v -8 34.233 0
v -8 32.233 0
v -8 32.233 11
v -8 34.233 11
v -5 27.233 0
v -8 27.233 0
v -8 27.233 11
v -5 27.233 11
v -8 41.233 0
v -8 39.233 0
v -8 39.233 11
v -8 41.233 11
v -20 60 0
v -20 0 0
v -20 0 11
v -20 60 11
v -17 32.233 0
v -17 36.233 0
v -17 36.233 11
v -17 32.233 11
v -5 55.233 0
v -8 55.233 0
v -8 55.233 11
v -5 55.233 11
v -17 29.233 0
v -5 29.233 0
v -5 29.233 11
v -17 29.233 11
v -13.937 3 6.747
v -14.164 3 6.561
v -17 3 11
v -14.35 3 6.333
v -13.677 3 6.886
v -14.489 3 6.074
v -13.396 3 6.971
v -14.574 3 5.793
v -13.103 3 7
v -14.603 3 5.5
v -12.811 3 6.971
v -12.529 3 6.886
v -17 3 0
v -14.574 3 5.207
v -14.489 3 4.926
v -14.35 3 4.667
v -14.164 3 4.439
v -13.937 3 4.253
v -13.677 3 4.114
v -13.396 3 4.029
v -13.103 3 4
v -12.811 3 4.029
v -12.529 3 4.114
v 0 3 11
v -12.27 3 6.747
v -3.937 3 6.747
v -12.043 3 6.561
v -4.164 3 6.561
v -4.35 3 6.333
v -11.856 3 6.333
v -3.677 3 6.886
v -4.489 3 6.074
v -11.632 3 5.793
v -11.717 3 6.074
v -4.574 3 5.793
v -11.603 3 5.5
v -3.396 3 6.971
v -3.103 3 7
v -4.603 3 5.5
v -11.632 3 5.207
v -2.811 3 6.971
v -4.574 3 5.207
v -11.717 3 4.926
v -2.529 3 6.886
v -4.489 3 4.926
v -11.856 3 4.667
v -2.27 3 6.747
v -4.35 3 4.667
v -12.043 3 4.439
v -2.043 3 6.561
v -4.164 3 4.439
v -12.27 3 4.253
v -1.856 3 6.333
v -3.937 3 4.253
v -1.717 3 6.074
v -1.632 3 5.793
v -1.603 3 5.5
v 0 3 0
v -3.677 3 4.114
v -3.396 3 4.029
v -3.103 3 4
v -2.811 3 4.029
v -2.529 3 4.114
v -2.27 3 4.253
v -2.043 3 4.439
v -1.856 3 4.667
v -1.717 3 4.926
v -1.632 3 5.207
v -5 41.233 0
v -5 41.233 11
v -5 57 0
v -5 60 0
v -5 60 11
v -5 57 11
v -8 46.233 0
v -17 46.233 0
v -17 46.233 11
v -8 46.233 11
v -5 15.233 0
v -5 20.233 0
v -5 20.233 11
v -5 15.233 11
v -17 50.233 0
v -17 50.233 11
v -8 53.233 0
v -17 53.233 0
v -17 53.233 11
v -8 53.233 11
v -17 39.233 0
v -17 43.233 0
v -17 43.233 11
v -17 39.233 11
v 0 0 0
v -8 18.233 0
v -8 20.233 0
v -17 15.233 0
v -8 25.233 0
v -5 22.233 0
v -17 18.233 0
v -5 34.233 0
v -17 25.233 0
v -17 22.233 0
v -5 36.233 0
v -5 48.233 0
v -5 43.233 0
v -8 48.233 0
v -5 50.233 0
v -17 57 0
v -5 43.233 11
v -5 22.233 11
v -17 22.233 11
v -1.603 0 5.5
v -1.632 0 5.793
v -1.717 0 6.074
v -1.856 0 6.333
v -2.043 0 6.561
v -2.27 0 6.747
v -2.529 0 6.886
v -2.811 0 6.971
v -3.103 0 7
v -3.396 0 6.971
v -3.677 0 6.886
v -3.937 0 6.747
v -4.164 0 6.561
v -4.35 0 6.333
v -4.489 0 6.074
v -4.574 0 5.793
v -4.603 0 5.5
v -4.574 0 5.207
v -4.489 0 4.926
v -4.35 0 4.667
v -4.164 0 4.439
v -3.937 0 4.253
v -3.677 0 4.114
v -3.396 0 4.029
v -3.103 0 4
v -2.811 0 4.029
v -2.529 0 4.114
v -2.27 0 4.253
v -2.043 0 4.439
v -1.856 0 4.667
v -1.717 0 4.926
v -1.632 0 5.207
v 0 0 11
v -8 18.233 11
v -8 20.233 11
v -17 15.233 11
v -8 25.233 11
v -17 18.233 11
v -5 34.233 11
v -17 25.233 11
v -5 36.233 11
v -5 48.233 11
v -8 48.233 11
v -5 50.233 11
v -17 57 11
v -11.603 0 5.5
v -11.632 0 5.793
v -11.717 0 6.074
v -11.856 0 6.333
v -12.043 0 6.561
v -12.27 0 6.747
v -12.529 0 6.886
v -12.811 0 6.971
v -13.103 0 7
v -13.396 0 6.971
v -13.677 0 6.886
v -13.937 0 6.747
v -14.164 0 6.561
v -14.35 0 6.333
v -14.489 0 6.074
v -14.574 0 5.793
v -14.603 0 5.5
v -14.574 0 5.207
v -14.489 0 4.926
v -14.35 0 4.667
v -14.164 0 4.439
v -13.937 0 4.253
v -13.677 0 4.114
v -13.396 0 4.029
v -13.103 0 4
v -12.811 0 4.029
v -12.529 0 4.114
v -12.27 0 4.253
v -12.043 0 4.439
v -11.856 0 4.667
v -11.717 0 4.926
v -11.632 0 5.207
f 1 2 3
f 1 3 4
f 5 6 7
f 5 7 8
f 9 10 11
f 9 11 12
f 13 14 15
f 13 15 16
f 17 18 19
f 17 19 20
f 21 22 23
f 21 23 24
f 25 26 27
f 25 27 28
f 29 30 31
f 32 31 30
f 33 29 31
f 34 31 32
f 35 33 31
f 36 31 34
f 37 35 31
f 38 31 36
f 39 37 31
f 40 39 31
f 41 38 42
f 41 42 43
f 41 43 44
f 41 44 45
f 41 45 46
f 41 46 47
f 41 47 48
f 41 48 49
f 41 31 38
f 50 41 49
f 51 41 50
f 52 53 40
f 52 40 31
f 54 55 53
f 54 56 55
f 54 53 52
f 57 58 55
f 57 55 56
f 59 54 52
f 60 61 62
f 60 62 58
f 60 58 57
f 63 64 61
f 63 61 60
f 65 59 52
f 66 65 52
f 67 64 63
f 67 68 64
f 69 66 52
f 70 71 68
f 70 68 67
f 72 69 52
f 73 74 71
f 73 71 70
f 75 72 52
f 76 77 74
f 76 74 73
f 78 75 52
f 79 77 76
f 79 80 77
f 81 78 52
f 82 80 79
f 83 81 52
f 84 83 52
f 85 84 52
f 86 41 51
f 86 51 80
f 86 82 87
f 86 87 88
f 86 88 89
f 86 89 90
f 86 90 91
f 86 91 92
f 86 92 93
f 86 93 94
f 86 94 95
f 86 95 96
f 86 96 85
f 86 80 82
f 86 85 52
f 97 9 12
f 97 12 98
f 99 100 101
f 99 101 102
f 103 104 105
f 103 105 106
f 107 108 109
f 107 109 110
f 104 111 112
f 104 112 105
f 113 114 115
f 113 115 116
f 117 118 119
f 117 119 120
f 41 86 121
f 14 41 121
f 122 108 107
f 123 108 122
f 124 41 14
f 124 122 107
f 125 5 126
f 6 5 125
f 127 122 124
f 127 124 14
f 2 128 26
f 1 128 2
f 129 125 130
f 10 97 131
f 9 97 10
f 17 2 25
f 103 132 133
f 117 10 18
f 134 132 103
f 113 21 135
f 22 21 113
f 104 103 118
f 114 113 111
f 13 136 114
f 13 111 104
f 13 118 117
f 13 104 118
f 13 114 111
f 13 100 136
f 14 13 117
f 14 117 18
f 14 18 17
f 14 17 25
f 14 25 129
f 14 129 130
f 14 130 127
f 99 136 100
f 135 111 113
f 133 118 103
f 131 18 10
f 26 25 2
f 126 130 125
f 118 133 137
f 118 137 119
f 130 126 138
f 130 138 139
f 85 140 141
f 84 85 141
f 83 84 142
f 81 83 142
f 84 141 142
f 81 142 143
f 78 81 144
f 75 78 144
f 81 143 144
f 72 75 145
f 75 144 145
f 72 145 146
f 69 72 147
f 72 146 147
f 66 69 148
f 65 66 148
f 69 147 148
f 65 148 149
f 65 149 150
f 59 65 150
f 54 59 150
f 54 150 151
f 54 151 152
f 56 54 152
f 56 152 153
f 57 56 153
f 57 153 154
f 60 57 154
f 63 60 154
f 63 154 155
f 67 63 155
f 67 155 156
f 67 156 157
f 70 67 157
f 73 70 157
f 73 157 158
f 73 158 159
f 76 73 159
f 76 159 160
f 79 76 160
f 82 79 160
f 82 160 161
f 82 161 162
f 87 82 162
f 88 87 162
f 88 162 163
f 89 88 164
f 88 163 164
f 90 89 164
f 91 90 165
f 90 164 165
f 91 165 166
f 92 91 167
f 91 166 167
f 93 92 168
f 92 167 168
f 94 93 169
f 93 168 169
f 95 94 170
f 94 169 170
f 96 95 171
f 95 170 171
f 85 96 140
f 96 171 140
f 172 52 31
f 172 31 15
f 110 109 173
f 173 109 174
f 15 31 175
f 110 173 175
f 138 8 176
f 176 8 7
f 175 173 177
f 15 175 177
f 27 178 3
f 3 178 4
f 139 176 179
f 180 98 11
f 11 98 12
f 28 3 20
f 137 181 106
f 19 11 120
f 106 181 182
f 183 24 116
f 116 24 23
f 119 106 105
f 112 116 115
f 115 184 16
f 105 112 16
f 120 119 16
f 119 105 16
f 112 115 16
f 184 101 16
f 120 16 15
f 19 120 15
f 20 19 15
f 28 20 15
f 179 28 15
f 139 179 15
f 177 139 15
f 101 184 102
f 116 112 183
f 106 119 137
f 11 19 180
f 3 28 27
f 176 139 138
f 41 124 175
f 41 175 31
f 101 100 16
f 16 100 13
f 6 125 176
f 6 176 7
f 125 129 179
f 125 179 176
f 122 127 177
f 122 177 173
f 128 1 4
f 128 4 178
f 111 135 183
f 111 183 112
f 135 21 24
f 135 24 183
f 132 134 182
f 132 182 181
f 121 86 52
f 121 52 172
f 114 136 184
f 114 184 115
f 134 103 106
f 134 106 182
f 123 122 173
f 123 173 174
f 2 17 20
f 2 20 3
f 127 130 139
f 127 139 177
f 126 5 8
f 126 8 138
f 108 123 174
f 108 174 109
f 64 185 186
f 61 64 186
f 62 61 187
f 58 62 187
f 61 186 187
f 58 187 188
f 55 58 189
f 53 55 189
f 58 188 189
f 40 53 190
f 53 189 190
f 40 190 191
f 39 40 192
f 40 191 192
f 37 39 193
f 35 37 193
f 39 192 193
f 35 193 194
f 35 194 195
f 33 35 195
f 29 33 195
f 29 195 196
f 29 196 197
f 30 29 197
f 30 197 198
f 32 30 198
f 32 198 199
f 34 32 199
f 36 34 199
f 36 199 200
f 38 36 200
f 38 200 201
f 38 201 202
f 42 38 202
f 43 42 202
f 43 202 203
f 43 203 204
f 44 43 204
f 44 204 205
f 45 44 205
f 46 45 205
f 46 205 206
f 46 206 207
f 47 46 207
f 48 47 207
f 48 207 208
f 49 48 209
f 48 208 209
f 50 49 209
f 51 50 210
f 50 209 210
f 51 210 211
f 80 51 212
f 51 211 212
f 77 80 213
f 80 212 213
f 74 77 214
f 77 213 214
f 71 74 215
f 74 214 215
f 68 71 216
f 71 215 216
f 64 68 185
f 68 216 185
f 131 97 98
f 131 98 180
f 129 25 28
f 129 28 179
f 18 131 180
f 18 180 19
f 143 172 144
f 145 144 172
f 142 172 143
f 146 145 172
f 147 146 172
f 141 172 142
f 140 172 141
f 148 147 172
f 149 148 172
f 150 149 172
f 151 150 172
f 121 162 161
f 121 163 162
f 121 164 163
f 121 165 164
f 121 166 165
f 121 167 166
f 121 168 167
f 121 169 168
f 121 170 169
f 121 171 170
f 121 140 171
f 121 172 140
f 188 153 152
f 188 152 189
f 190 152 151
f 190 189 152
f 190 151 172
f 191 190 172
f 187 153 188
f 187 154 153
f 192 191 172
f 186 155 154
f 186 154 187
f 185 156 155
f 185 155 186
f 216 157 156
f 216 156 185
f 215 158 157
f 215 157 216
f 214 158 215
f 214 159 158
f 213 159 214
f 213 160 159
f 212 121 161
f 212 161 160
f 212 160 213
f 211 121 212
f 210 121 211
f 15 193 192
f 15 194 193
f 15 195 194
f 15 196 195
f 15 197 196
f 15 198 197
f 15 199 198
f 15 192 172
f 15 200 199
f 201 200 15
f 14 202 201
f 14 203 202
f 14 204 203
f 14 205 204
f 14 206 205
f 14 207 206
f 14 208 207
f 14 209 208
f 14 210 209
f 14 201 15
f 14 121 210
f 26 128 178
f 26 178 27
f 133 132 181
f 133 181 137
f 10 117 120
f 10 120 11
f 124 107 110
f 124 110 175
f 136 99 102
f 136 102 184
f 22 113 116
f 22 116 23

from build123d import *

# Parameters (mm, degrees)
BOSS_EXTRUDE2_DEPTH = 11
SKETCH4_R           = 1.5
CUT_EXTRUDE1_DEPTH  = 11


with BuildPart() as part:
    # Sketch1 → Boss-Extrude2 (new body)
    with BuildSketch(Plane.XY):
        Polygon((0, 0), (-20, 0), (-20, 60), (-17, 60), (-5, 60), (-5, 57), (-17, 57), (-17, 53.232919745), (-8, 53.232919745), (-8, 55.232919745), (-5, 55.232919745), (-5, 50.232919745), (-17, 50.232919745), (-17, 46.232919745), (-8, 46.232919745), (-8, 48.232919745), (-5, 48.232919745), (-5, 43.232919745), (-17, 43.232919745), (-17, 39.232919745), (-8, 39.232919745), (-8, 41.232919745), (-5, 41.232919745), (-5, 36.232919745), (-17, 36.232919745), (-17, 32.232919745), (-8, 32.232919745), (-8, 34.232919745), (-5, 34.232919745), (-5, 29.232919745), (-17, 29.232919745), (-17, 25.232919745), (-8, 25.232919745), (-8, 27.232919745), (-5, 27.232919745), (-5, 22.232919745), (-17, 22.232919745), (-17, 18.232919745), (-8, 18.232919745), (-8, 20.232919745), (-5, 20.232919745), (-5, 15.232919745), (-17, 15.232919745), (-17, 3), (0, 3), align=None)
    extrude(amount=BOSS_EXTRUDE2_DEPTH)

    # Sketch4 → Cut-Extrude1 (cut)
    with BuildSketch(Plane.XZ):
        with Locations((-3.103292827, 5.5)):
            Circle(SKETCH4_R)
        with Locations((-13.103292827, 5.5)):
            Circle(SKETCH4_R)
    extrude(amount=-CUT_EXTRUDE1_DEPTH, mode=Mode.SUBTRACT)


solid = part.part
